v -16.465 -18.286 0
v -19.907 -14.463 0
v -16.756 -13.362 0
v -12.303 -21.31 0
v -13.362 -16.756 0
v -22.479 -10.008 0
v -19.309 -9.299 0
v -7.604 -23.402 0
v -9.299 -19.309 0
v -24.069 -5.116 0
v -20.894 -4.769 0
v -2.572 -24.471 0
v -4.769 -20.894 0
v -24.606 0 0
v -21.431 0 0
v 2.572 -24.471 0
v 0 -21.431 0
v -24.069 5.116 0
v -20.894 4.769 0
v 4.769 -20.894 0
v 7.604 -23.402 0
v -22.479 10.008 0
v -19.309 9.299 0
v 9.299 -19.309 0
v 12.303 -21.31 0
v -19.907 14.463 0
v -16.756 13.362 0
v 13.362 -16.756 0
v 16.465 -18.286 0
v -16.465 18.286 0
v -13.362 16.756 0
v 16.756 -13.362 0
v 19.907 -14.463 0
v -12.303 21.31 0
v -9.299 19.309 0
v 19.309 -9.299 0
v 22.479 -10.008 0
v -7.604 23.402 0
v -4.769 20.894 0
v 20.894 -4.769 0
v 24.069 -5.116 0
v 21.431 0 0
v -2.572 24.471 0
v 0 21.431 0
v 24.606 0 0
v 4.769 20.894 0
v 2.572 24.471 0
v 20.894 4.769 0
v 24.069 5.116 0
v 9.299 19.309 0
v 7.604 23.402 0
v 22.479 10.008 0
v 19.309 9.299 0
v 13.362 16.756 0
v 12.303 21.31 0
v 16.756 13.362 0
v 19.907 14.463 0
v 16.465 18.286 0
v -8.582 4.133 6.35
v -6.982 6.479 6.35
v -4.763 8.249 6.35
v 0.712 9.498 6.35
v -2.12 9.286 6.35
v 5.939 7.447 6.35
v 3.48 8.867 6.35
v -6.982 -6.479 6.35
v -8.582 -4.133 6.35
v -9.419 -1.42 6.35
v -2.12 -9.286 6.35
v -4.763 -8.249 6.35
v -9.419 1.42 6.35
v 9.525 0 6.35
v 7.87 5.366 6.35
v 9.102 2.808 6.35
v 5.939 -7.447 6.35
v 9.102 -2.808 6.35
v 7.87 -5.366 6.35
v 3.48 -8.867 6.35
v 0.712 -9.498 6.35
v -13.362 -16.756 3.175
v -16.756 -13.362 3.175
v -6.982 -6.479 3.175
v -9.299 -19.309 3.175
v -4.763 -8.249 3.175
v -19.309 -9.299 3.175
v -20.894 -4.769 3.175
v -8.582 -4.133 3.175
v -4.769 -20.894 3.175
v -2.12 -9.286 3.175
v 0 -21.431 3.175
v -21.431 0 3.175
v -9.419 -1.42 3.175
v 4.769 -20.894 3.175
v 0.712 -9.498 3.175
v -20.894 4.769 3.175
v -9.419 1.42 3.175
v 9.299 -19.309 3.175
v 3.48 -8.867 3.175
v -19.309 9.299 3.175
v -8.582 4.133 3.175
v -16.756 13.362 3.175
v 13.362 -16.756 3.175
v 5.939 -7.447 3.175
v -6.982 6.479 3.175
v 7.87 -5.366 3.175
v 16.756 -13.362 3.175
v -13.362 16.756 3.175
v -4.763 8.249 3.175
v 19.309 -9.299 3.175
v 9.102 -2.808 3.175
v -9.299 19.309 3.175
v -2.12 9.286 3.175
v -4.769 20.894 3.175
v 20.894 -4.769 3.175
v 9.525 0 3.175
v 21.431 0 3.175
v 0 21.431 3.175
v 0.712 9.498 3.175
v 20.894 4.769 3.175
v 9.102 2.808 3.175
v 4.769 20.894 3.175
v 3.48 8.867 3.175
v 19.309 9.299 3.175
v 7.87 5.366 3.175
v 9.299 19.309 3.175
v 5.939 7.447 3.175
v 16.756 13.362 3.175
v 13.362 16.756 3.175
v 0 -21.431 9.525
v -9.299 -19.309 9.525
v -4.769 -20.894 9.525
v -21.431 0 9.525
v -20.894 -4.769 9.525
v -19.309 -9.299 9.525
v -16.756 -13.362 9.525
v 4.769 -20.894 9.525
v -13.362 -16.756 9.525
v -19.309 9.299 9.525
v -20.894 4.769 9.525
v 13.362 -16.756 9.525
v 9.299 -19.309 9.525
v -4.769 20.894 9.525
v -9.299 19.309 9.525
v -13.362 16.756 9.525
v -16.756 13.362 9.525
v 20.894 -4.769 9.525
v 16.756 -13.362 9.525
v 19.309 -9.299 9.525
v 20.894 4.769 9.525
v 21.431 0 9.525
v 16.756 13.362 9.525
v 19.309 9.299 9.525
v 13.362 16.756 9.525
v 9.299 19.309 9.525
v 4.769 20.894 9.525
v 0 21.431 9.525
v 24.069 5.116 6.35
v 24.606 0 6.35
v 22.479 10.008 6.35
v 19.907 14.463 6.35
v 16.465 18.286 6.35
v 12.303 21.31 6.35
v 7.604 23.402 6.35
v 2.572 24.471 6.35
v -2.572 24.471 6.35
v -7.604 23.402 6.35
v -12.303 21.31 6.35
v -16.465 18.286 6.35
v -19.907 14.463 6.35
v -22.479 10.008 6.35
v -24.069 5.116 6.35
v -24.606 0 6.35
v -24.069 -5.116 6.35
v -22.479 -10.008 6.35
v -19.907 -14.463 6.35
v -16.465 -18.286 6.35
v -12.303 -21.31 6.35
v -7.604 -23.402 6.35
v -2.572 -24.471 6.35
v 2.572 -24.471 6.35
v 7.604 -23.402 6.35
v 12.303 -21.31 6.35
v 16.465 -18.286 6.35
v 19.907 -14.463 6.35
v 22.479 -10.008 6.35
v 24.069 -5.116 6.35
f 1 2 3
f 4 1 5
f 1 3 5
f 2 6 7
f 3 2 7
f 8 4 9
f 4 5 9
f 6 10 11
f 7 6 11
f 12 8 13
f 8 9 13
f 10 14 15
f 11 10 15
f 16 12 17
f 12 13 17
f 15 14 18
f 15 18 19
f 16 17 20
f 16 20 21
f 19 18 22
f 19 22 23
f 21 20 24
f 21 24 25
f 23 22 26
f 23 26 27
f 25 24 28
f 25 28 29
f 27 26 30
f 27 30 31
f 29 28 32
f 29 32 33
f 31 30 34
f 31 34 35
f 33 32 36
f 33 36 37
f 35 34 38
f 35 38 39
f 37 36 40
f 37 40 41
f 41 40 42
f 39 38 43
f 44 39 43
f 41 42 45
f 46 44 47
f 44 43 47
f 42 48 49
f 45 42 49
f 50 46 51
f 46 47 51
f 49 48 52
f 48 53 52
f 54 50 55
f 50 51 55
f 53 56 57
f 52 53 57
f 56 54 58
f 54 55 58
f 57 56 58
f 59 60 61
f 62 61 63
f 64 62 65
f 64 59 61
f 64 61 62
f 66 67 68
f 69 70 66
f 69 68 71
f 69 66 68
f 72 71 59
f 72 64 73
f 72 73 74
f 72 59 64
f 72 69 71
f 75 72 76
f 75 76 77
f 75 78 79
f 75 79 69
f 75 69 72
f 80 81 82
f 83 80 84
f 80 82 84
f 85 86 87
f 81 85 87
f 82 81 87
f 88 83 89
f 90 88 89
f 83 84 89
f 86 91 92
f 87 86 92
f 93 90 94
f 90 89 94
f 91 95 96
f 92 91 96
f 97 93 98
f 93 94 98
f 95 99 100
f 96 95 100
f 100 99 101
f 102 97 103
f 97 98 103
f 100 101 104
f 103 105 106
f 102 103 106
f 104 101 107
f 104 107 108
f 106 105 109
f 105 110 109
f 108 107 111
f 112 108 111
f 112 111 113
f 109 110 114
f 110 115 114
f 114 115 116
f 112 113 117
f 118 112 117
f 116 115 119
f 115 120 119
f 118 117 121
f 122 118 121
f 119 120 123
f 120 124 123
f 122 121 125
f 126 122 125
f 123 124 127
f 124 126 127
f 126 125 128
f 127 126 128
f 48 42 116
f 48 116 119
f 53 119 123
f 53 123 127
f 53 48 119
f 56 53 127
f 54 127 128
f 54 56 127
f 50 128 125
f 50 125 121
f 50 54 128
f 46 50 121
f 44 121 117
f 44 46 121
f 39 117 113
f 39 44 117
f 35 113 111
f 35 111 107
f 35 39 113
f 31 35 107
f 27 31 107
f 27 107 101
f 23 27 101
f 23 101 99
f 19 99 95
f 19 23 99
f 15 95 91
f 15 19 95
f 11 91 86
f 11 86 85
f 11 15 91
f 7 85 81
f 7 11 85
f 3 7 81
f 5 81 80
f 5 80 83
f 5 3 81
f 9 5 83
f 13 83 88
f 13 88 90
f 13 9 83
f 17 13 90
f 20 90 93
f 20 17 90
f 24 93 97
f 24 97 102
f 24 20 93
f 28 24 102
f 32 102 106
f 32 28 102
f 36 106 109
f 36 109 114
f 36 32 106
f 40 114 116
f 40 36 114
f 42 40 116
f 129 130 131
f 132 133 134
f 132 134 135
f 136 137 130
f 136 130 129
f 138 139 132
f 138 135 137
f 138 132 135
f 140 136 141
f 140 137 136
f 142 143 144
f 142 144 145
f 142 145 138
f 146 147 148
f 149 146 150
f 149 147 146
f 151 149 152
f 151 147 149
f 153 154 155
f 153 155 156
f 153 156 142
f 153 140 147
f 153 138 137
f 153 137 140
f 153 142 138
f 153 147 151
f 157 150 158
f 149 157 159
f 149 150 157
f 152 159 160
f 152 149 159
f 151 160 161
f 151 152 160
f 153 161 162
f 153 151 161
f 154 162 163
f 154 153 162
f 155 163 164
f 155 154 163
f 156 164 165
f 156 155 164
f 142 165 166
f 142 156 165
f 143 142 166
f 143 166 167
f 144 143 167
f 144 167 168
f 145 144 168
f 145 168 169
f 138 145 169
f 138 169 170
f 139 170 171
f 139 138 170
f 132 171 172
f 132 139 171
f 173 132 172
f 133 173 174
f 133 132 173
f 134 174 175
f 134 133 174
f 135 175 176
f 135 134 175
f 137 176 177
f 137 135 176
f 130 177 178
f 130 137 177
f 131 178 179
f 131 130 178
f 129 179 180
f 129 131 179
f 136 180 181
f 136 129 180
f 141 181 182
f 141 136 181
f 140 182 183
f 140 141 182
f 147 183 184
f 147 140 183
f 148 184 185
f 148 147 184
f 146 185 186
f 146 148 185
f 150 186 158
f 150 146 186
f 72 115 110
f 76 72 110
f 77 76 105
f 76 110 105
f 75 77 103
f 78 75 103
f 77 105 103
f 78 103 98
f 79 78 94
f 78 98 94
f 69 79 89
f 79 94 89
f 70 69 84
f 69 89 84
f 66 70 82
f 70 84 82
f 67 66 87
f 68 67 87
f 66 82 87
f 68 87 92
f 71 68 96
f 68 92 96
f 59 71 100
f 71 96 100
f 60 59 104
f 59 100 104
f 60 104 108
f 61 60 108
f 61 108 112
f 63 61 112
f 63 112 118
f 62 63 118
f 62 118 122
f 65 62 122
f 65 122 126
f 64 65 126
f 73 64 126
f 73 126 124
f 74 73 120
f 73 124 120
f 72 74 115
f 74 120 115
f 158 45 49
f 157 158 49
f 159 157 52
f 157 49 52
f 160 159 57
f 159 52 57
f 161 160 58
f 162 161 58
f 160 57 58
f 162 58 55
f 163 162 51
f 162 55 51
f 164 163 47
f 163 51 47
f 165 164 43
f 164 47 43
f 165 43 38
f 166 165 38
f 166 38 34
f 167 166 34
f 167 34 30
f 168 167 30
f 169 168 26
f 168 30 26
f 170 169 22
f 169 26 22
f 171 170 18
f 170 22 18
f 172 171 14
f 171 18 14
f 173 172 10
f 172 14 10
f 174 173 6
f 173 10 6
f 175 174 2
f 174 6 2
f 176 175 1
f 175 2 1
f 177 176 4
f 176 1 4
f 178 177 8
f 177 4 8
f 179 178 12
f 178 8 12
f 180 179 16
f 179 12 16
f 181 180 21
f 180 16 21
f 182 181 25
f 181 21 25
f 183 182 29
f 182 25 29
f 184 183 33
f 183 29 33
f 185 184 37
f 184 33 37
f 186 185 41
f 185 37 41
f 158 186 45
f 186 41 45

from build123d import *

# Parameters (mm, degrees)
F0_R     = 24.60625
F1_DEPTH = 9.525
F2_R     = 21.43125
F3_DEPTH = 3.175
F4_R     = 9.525
F5_DEPTH = 3.175
F6_SIZE  = 3.175


with BuildPart() as f1:
    # F0 (on Top) → F1 (new body)
    with BuildSketch(Plane.XY):
        Circle(F0_R)
    extrude(amount=F1_DEPTH)

    # F2 (on face) → F3 (cut)
    with BuildSketch(Plane.XY):
        Circle(F2_R)
    extrude(amount=F3_DEPTH, mode=Mode.SUBTRACT)

    # F4 (on face) → F5 (cut)
    with BuildSketch(Plane(origin=(0, 0, 3.175), x_dir=(1, 0, 0), z_dir=(0, 0, -1))):
        Circle(F4_R)
    extrude(amount=-F5_DEPTH, mode=Mode.SUBTRACT)

    # F6
    f6_edges = [f1.edges().sort_by_distance(p)[0] for p in [
        (-24.60625, 0, 9.525),
    ]]
    chamfer(f6_edges, length=F6_SIZE)


solid = f1.part
